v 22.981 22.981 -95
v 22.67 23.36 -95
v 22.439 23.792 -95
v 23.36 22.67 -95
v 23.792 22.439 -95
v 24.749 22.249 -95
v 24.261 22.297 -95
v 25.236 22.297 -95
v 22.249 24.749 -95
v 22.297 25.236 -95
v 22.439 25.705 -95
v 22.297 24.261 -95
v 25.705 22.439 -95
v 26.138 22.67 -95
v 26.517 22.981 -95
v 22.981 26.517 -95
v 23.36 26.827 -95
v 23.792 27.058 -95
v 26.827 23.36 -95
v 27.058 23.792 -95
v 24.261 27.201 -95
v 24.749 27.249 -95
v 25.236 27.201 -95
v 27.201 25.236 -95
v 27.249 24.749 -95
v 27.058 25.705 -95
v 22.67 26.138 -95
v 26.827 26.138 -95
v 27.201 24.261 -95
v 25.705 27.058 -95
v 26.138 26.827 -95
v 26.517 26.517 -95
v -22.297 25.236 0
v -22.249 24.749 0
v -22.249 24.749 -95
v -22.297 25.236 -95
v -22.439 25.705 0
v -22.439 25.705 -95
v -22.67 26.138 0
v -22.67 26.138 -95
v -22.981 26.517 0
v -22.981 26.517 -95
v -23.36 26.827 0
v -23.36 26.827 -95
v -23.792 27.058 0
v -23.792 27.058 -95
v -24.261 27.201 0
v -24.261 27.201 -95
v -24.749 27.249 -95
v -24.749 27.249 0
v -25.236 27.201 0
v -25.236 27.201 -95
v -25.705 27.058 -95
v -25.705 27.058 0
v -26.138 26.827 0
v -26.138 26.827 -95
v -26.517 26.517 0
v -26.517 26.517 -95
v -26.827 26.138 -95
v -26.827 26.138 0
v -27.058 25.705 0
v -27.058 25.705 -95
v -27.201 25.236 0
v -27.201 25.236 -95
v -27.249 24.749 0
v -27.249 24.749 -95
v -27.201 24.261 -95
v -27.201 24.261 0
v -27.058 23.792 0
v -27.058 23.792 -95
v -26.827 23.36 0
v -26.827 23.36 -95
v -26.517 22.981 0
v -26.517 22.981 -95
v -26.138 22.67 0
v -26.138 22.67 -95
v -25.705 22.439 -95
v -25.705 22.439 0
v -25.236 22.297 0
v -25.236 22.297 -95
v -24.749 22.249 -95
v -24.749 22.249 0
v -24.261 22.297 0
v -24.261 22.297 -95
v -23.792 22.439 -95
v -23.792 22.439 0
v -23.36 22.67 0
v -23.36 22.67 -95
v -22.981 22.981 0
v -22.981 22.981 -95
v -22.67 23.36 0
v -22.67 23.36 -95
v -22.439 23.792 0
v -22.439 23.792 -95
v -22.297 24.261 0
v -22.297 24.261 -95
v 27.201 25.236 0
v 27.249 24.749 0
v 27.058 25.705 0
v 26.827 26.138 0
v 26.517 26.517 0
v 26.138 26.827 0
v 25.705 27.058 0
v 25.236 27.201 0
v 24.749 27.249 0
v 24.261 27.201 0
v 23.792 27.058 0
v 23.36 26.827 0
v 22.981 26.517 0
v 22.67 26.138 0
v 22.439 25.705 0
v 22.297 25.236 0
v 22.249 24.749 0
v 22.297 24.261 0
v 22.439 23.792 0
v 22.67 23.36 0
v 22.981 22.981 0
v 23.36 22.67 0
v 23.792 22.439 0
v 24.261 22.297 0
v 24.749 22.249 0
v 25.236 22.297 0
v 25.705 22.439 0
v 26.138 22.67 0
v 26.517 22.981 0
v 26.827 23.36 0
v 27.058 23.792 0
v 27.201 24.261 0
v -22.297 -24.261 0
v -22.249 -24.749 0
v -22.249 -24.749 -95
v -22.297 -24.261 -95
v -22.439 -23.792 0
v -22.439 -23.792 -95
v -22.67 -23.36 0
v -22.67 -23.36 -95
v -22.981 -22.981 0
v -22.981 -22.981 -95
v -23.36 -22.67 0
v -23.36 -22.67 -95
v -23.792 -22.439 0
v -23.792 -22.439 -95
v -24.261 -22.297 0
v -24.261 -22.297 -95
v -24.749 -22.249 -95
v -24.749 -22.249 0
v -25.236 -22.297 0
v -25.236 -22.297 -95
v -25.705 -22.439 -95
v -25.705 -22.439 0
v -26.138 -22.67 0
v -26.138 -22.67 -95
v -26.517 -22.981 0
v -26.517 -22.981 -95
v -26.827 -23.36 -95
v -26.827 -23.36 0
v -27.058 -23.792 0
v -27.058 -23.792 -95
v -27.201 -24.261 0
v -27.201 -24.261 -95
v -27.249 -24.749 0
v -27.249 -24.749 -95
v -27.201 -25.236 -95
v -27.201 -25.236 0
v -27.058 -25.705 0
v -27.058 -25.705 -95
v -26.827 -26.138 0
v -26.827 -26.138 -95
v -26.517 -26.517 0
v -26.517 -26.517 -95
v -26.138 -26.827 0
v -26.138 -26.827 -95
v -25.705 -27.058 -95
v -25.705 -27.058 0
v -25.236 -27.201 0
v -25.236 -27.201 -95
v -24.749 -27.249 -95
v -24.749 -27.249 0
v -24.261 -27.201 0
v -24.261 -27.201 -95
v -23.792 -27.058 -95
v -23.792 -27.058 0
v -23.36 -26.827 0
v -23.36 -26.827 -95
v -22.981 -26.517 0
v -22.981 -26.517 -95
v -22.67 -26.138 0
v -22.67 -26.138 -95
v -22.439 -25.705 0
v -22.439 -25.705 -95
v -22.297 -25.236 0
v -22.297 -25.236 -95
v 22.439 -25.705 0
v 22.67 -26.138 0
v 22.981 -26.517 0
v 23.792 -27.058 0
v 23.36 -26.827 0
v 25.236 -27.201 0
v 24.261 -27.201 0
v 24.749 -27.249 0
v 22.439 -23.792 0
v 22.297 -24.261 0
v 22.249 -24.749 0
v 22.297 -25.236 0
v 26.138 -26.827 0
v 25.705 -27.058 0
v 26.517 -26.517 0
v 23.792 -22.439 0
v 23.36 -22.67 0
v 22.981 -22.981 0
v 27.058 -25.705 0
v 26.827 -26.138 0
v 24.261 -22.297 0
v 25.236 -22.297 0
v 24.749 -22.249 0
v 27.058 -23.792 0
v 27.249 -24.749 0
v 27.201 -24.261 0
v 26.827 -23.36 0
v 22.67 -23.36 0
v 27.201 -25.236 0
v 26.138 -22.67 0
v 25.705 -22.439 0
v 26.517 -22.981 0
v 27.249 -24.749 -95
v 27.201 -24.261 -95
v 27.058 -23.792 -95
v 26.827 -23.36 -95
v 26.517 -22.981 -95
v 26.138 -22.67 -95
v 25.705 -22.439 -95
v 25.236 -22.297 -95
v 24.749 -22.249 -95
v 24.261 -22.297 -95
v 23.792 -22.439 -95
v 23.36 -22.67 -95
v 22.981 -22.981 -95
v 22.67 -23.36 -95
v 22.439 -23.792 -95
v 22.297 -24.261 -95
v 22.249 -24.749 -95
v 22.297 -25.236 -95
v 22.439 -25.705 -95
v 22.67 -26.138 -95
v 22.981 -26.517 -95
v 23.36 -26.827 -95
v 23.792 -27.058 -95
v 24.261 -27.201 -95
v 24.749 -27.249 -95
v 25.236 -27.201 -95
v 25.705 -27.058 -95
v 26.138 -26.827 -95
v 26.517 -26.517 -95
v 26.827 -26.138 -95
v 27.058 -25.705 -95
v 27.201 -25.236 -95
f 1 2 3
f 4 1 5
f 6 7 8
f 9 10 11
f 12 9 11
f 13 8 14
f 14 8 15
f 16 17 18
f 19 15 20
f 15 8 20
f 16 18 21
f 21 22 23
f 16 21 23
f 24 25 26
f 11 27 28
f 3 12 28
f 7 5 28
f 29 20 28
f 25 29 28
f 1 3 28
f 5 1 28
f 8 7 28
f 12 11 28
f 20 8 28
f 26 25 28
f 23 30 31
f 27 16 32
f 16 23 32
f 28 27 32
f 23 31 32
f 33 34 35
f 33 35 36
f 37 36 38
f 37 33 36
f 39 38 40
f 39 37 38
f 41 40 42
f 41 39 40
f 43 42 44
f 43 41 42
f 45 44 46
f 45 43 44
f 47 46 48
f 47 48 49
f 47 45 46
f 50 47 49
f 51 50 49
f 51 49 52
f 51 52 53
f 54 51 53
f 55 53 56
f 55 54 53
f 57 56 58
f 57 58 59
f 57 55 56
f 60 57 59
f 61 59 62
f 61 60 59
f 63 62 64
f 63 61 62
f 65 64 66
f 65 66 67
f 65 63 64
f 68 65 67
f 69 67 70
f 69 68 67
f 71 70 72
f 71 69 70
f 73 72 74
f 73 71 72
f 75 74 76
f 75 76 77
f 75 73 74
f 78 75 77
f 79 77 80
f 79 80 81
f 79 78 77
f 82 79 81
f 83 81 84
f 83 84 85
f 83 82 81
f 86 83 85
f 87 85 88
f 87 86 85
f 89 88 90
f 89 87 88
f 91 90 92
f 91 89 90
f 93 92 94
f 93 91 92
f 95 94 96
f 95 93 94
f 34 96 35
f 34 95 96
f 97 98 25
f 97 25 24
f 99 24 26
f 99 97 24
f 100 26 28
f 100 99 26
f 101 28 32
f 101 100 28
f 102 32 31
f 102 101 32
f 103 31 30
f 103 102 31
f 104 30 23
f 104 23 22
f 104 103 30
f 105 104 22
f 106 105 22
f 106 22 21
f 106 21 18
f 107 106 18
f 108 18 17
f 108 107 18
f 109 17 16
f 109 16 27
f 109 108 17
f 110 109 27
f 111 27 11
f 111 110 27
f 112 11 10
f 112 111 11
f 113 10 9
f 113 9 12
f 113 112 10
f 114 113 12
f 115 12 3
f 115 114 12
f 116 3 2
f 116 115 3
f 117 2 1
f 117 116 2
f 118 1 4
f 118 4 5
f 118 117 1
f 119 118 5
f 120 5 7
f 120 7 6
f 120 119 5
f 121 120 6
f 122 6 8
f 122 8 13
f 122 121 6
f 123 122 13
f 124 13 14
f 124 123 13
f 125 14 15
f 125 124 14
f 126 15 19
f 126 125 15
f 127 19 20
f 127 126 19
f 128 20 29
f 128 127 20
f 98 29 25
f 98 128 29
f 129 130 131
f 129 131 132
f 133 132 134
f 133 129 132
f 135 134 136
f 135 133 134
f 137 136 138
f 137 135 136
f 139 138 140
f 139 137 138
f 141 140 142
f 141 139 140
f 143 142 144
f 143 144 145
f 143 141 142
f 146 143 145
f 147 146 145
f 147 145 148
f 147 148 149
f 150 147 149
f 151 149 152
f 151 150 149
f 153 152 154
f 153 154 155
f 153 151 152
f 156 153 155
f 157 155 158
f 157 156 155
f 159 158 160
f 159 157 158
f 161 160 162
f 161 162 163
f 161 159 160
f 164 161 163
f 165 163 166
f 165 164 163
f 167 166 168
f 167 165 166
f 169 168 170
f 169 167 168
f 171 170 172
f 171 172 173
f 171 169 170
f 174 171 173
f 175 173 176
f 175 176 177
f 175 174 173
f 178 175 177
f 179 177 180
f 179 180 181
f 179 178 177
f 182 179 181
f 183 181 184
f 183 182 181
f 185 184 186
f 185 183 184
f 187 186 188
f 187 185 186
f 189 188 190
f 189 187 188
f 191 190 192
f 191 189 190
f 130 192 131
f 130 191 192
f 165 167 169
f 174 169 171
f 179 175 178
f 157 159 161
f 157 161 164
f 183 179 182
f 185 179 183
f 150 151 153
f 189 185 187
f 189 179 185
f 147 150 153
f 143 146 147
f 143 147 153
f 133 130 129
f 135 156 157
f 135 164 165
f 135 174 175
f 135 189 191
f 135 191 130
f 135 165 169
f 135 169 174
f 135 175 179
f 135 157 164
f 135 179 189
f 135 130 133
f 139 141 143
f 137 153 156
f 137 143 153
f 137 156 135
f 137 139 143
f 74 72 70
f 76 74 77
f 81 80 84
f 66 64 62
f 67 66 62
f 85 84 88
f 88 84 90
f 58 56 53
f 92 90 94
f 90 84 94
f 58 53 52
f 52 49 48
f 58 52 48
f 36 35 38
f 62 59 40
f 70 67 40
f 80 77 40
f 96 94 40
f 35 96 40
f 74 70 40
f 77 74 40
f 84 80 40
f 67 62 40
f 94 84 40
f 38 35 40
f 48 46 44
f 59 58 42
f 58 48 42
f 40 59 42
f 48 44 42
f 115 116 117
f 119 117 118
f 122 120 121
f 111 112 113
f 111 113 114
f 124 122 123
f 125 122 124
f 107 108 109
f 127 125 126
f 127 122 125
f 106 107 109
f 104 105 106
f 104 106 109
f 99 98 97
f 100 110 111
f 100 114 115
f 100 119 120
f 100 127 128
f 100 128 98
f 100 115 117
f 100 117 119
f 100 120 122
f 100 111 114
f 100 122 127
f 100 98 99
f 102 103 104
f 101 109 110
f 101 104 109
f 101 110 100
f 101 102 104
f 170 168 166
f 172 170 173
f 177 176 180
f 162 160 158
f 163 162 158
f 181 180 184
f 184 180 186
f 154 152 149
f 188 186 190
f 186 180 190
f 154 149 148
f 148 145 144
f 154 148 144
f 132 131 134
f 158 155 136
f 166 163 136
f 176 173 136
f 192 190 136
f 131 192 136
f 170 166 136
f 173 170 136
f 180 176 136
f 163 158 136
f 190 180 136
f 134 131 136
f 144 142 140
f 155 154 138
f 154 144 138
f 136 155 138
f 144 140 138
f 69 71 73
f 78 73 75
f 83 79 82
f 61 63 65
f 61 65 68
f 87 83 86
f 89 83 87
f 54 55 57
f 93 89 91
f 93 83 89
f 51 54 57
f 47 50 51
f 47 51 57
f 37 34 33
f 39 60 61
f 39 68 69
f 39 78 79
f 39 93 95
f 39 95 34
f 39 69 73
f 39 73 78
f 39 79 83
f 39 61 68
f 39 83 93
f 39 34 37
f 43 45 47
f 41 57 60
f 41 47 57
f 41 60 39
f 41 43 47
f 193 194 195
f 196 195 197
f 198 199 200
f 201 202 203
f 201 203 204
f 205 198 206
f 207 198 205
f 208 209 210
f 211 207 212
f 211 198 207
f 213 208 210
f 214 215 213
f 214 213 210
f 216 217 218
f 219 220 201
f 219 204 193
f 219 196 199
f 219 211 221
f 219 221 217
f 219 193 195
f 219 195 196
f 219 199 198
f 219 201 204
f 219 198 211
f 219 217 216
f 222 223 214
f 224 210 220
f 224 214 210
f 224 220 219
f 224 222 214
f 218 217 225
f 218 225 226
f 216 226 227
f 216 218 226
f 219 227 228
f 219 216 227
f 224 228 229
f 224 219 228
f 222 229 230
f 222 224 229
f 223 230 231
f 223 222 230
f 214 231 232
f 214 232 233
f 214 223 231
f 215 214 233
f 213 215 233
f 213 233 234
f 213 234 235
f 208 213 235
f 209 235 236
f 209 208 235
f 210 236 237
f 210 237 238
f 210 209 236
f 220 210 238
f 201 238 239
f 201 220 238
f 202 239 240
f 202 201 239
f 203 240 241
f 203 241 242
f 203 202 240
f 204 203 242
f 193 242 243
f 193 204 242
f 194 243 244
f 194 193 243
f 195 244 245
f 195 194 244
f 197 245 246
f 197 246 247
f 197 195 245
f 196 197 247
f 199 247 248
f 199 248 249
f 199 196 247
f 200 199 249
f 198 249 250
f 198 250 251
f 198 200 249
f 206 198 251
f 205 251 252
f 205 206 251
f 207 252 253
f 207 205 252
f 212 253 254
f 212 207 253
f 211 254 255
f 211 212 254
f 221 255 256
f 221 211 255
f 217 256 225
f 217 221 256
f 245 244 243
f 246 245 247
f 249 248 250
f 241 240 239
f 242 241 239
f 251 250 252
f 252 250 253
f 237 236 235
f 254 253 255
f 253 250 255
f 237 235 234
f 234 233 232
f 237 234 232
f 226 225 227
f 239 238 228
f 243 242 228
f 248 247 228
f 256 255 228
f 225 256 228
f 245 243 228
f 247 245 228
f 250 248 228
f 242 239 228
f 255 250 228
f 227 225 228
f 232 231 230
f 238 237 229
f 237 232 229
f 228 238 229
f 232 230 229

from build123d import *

# Parameters (mm, degrees)
SKETCH_1_R        = 2.5
EXTRUDE_1_DEPTH   = 95
EXTRUDE_1_2_DEPTH = 95
EXTRUDE_1_3_DEPTH = 95
EXTRUDE_1_4_DEPTH = 95


with BuildPart() as part:
    # 草图1 → 凸台-拉伸1 (new body)
    with BuildSketch(Plane.XY):
        with Locations((24.748737342, 24.748737342)):
            Circle(SKETCH_1_R)
    extrude(amount=-EXTRUDE_1_DEPTH)


with BuildPart() as body_2:
    # 草图1 → Extrude 1 2 (new body)
    with BuildSketch(Plane.XY):
        with Locations((-24.748737342, 24.748737342)):
            Circle(SKETCH_1_R)
    extrude(amount=-EXTRUDE_1_2_DEPTH)


with BuildPart() as body_3:
    # 草图1 → Extrude 1 3 (new body)
    with BuildSketch(Plane.XY):
        with Locations((-24.748737342, -24.748737342)):
            Circle(SKETCH_1_R)
    extrude(amount=-EXTRUDE_1_3_DEPTH)


with BuildPart() as body_4:
    # 草图1 → Extrude 1 4 (new body)
    with BuildSketch(Plane.XY):
        with Locations((24.748737342, -24.748737342)):
            Circle(SKETCH_1_R)
    extrude(amount=-EXTRUDE_1_4_DEPTH)


solid = Compound([part.part, body_2.part, body_3.part, body_4.part])
